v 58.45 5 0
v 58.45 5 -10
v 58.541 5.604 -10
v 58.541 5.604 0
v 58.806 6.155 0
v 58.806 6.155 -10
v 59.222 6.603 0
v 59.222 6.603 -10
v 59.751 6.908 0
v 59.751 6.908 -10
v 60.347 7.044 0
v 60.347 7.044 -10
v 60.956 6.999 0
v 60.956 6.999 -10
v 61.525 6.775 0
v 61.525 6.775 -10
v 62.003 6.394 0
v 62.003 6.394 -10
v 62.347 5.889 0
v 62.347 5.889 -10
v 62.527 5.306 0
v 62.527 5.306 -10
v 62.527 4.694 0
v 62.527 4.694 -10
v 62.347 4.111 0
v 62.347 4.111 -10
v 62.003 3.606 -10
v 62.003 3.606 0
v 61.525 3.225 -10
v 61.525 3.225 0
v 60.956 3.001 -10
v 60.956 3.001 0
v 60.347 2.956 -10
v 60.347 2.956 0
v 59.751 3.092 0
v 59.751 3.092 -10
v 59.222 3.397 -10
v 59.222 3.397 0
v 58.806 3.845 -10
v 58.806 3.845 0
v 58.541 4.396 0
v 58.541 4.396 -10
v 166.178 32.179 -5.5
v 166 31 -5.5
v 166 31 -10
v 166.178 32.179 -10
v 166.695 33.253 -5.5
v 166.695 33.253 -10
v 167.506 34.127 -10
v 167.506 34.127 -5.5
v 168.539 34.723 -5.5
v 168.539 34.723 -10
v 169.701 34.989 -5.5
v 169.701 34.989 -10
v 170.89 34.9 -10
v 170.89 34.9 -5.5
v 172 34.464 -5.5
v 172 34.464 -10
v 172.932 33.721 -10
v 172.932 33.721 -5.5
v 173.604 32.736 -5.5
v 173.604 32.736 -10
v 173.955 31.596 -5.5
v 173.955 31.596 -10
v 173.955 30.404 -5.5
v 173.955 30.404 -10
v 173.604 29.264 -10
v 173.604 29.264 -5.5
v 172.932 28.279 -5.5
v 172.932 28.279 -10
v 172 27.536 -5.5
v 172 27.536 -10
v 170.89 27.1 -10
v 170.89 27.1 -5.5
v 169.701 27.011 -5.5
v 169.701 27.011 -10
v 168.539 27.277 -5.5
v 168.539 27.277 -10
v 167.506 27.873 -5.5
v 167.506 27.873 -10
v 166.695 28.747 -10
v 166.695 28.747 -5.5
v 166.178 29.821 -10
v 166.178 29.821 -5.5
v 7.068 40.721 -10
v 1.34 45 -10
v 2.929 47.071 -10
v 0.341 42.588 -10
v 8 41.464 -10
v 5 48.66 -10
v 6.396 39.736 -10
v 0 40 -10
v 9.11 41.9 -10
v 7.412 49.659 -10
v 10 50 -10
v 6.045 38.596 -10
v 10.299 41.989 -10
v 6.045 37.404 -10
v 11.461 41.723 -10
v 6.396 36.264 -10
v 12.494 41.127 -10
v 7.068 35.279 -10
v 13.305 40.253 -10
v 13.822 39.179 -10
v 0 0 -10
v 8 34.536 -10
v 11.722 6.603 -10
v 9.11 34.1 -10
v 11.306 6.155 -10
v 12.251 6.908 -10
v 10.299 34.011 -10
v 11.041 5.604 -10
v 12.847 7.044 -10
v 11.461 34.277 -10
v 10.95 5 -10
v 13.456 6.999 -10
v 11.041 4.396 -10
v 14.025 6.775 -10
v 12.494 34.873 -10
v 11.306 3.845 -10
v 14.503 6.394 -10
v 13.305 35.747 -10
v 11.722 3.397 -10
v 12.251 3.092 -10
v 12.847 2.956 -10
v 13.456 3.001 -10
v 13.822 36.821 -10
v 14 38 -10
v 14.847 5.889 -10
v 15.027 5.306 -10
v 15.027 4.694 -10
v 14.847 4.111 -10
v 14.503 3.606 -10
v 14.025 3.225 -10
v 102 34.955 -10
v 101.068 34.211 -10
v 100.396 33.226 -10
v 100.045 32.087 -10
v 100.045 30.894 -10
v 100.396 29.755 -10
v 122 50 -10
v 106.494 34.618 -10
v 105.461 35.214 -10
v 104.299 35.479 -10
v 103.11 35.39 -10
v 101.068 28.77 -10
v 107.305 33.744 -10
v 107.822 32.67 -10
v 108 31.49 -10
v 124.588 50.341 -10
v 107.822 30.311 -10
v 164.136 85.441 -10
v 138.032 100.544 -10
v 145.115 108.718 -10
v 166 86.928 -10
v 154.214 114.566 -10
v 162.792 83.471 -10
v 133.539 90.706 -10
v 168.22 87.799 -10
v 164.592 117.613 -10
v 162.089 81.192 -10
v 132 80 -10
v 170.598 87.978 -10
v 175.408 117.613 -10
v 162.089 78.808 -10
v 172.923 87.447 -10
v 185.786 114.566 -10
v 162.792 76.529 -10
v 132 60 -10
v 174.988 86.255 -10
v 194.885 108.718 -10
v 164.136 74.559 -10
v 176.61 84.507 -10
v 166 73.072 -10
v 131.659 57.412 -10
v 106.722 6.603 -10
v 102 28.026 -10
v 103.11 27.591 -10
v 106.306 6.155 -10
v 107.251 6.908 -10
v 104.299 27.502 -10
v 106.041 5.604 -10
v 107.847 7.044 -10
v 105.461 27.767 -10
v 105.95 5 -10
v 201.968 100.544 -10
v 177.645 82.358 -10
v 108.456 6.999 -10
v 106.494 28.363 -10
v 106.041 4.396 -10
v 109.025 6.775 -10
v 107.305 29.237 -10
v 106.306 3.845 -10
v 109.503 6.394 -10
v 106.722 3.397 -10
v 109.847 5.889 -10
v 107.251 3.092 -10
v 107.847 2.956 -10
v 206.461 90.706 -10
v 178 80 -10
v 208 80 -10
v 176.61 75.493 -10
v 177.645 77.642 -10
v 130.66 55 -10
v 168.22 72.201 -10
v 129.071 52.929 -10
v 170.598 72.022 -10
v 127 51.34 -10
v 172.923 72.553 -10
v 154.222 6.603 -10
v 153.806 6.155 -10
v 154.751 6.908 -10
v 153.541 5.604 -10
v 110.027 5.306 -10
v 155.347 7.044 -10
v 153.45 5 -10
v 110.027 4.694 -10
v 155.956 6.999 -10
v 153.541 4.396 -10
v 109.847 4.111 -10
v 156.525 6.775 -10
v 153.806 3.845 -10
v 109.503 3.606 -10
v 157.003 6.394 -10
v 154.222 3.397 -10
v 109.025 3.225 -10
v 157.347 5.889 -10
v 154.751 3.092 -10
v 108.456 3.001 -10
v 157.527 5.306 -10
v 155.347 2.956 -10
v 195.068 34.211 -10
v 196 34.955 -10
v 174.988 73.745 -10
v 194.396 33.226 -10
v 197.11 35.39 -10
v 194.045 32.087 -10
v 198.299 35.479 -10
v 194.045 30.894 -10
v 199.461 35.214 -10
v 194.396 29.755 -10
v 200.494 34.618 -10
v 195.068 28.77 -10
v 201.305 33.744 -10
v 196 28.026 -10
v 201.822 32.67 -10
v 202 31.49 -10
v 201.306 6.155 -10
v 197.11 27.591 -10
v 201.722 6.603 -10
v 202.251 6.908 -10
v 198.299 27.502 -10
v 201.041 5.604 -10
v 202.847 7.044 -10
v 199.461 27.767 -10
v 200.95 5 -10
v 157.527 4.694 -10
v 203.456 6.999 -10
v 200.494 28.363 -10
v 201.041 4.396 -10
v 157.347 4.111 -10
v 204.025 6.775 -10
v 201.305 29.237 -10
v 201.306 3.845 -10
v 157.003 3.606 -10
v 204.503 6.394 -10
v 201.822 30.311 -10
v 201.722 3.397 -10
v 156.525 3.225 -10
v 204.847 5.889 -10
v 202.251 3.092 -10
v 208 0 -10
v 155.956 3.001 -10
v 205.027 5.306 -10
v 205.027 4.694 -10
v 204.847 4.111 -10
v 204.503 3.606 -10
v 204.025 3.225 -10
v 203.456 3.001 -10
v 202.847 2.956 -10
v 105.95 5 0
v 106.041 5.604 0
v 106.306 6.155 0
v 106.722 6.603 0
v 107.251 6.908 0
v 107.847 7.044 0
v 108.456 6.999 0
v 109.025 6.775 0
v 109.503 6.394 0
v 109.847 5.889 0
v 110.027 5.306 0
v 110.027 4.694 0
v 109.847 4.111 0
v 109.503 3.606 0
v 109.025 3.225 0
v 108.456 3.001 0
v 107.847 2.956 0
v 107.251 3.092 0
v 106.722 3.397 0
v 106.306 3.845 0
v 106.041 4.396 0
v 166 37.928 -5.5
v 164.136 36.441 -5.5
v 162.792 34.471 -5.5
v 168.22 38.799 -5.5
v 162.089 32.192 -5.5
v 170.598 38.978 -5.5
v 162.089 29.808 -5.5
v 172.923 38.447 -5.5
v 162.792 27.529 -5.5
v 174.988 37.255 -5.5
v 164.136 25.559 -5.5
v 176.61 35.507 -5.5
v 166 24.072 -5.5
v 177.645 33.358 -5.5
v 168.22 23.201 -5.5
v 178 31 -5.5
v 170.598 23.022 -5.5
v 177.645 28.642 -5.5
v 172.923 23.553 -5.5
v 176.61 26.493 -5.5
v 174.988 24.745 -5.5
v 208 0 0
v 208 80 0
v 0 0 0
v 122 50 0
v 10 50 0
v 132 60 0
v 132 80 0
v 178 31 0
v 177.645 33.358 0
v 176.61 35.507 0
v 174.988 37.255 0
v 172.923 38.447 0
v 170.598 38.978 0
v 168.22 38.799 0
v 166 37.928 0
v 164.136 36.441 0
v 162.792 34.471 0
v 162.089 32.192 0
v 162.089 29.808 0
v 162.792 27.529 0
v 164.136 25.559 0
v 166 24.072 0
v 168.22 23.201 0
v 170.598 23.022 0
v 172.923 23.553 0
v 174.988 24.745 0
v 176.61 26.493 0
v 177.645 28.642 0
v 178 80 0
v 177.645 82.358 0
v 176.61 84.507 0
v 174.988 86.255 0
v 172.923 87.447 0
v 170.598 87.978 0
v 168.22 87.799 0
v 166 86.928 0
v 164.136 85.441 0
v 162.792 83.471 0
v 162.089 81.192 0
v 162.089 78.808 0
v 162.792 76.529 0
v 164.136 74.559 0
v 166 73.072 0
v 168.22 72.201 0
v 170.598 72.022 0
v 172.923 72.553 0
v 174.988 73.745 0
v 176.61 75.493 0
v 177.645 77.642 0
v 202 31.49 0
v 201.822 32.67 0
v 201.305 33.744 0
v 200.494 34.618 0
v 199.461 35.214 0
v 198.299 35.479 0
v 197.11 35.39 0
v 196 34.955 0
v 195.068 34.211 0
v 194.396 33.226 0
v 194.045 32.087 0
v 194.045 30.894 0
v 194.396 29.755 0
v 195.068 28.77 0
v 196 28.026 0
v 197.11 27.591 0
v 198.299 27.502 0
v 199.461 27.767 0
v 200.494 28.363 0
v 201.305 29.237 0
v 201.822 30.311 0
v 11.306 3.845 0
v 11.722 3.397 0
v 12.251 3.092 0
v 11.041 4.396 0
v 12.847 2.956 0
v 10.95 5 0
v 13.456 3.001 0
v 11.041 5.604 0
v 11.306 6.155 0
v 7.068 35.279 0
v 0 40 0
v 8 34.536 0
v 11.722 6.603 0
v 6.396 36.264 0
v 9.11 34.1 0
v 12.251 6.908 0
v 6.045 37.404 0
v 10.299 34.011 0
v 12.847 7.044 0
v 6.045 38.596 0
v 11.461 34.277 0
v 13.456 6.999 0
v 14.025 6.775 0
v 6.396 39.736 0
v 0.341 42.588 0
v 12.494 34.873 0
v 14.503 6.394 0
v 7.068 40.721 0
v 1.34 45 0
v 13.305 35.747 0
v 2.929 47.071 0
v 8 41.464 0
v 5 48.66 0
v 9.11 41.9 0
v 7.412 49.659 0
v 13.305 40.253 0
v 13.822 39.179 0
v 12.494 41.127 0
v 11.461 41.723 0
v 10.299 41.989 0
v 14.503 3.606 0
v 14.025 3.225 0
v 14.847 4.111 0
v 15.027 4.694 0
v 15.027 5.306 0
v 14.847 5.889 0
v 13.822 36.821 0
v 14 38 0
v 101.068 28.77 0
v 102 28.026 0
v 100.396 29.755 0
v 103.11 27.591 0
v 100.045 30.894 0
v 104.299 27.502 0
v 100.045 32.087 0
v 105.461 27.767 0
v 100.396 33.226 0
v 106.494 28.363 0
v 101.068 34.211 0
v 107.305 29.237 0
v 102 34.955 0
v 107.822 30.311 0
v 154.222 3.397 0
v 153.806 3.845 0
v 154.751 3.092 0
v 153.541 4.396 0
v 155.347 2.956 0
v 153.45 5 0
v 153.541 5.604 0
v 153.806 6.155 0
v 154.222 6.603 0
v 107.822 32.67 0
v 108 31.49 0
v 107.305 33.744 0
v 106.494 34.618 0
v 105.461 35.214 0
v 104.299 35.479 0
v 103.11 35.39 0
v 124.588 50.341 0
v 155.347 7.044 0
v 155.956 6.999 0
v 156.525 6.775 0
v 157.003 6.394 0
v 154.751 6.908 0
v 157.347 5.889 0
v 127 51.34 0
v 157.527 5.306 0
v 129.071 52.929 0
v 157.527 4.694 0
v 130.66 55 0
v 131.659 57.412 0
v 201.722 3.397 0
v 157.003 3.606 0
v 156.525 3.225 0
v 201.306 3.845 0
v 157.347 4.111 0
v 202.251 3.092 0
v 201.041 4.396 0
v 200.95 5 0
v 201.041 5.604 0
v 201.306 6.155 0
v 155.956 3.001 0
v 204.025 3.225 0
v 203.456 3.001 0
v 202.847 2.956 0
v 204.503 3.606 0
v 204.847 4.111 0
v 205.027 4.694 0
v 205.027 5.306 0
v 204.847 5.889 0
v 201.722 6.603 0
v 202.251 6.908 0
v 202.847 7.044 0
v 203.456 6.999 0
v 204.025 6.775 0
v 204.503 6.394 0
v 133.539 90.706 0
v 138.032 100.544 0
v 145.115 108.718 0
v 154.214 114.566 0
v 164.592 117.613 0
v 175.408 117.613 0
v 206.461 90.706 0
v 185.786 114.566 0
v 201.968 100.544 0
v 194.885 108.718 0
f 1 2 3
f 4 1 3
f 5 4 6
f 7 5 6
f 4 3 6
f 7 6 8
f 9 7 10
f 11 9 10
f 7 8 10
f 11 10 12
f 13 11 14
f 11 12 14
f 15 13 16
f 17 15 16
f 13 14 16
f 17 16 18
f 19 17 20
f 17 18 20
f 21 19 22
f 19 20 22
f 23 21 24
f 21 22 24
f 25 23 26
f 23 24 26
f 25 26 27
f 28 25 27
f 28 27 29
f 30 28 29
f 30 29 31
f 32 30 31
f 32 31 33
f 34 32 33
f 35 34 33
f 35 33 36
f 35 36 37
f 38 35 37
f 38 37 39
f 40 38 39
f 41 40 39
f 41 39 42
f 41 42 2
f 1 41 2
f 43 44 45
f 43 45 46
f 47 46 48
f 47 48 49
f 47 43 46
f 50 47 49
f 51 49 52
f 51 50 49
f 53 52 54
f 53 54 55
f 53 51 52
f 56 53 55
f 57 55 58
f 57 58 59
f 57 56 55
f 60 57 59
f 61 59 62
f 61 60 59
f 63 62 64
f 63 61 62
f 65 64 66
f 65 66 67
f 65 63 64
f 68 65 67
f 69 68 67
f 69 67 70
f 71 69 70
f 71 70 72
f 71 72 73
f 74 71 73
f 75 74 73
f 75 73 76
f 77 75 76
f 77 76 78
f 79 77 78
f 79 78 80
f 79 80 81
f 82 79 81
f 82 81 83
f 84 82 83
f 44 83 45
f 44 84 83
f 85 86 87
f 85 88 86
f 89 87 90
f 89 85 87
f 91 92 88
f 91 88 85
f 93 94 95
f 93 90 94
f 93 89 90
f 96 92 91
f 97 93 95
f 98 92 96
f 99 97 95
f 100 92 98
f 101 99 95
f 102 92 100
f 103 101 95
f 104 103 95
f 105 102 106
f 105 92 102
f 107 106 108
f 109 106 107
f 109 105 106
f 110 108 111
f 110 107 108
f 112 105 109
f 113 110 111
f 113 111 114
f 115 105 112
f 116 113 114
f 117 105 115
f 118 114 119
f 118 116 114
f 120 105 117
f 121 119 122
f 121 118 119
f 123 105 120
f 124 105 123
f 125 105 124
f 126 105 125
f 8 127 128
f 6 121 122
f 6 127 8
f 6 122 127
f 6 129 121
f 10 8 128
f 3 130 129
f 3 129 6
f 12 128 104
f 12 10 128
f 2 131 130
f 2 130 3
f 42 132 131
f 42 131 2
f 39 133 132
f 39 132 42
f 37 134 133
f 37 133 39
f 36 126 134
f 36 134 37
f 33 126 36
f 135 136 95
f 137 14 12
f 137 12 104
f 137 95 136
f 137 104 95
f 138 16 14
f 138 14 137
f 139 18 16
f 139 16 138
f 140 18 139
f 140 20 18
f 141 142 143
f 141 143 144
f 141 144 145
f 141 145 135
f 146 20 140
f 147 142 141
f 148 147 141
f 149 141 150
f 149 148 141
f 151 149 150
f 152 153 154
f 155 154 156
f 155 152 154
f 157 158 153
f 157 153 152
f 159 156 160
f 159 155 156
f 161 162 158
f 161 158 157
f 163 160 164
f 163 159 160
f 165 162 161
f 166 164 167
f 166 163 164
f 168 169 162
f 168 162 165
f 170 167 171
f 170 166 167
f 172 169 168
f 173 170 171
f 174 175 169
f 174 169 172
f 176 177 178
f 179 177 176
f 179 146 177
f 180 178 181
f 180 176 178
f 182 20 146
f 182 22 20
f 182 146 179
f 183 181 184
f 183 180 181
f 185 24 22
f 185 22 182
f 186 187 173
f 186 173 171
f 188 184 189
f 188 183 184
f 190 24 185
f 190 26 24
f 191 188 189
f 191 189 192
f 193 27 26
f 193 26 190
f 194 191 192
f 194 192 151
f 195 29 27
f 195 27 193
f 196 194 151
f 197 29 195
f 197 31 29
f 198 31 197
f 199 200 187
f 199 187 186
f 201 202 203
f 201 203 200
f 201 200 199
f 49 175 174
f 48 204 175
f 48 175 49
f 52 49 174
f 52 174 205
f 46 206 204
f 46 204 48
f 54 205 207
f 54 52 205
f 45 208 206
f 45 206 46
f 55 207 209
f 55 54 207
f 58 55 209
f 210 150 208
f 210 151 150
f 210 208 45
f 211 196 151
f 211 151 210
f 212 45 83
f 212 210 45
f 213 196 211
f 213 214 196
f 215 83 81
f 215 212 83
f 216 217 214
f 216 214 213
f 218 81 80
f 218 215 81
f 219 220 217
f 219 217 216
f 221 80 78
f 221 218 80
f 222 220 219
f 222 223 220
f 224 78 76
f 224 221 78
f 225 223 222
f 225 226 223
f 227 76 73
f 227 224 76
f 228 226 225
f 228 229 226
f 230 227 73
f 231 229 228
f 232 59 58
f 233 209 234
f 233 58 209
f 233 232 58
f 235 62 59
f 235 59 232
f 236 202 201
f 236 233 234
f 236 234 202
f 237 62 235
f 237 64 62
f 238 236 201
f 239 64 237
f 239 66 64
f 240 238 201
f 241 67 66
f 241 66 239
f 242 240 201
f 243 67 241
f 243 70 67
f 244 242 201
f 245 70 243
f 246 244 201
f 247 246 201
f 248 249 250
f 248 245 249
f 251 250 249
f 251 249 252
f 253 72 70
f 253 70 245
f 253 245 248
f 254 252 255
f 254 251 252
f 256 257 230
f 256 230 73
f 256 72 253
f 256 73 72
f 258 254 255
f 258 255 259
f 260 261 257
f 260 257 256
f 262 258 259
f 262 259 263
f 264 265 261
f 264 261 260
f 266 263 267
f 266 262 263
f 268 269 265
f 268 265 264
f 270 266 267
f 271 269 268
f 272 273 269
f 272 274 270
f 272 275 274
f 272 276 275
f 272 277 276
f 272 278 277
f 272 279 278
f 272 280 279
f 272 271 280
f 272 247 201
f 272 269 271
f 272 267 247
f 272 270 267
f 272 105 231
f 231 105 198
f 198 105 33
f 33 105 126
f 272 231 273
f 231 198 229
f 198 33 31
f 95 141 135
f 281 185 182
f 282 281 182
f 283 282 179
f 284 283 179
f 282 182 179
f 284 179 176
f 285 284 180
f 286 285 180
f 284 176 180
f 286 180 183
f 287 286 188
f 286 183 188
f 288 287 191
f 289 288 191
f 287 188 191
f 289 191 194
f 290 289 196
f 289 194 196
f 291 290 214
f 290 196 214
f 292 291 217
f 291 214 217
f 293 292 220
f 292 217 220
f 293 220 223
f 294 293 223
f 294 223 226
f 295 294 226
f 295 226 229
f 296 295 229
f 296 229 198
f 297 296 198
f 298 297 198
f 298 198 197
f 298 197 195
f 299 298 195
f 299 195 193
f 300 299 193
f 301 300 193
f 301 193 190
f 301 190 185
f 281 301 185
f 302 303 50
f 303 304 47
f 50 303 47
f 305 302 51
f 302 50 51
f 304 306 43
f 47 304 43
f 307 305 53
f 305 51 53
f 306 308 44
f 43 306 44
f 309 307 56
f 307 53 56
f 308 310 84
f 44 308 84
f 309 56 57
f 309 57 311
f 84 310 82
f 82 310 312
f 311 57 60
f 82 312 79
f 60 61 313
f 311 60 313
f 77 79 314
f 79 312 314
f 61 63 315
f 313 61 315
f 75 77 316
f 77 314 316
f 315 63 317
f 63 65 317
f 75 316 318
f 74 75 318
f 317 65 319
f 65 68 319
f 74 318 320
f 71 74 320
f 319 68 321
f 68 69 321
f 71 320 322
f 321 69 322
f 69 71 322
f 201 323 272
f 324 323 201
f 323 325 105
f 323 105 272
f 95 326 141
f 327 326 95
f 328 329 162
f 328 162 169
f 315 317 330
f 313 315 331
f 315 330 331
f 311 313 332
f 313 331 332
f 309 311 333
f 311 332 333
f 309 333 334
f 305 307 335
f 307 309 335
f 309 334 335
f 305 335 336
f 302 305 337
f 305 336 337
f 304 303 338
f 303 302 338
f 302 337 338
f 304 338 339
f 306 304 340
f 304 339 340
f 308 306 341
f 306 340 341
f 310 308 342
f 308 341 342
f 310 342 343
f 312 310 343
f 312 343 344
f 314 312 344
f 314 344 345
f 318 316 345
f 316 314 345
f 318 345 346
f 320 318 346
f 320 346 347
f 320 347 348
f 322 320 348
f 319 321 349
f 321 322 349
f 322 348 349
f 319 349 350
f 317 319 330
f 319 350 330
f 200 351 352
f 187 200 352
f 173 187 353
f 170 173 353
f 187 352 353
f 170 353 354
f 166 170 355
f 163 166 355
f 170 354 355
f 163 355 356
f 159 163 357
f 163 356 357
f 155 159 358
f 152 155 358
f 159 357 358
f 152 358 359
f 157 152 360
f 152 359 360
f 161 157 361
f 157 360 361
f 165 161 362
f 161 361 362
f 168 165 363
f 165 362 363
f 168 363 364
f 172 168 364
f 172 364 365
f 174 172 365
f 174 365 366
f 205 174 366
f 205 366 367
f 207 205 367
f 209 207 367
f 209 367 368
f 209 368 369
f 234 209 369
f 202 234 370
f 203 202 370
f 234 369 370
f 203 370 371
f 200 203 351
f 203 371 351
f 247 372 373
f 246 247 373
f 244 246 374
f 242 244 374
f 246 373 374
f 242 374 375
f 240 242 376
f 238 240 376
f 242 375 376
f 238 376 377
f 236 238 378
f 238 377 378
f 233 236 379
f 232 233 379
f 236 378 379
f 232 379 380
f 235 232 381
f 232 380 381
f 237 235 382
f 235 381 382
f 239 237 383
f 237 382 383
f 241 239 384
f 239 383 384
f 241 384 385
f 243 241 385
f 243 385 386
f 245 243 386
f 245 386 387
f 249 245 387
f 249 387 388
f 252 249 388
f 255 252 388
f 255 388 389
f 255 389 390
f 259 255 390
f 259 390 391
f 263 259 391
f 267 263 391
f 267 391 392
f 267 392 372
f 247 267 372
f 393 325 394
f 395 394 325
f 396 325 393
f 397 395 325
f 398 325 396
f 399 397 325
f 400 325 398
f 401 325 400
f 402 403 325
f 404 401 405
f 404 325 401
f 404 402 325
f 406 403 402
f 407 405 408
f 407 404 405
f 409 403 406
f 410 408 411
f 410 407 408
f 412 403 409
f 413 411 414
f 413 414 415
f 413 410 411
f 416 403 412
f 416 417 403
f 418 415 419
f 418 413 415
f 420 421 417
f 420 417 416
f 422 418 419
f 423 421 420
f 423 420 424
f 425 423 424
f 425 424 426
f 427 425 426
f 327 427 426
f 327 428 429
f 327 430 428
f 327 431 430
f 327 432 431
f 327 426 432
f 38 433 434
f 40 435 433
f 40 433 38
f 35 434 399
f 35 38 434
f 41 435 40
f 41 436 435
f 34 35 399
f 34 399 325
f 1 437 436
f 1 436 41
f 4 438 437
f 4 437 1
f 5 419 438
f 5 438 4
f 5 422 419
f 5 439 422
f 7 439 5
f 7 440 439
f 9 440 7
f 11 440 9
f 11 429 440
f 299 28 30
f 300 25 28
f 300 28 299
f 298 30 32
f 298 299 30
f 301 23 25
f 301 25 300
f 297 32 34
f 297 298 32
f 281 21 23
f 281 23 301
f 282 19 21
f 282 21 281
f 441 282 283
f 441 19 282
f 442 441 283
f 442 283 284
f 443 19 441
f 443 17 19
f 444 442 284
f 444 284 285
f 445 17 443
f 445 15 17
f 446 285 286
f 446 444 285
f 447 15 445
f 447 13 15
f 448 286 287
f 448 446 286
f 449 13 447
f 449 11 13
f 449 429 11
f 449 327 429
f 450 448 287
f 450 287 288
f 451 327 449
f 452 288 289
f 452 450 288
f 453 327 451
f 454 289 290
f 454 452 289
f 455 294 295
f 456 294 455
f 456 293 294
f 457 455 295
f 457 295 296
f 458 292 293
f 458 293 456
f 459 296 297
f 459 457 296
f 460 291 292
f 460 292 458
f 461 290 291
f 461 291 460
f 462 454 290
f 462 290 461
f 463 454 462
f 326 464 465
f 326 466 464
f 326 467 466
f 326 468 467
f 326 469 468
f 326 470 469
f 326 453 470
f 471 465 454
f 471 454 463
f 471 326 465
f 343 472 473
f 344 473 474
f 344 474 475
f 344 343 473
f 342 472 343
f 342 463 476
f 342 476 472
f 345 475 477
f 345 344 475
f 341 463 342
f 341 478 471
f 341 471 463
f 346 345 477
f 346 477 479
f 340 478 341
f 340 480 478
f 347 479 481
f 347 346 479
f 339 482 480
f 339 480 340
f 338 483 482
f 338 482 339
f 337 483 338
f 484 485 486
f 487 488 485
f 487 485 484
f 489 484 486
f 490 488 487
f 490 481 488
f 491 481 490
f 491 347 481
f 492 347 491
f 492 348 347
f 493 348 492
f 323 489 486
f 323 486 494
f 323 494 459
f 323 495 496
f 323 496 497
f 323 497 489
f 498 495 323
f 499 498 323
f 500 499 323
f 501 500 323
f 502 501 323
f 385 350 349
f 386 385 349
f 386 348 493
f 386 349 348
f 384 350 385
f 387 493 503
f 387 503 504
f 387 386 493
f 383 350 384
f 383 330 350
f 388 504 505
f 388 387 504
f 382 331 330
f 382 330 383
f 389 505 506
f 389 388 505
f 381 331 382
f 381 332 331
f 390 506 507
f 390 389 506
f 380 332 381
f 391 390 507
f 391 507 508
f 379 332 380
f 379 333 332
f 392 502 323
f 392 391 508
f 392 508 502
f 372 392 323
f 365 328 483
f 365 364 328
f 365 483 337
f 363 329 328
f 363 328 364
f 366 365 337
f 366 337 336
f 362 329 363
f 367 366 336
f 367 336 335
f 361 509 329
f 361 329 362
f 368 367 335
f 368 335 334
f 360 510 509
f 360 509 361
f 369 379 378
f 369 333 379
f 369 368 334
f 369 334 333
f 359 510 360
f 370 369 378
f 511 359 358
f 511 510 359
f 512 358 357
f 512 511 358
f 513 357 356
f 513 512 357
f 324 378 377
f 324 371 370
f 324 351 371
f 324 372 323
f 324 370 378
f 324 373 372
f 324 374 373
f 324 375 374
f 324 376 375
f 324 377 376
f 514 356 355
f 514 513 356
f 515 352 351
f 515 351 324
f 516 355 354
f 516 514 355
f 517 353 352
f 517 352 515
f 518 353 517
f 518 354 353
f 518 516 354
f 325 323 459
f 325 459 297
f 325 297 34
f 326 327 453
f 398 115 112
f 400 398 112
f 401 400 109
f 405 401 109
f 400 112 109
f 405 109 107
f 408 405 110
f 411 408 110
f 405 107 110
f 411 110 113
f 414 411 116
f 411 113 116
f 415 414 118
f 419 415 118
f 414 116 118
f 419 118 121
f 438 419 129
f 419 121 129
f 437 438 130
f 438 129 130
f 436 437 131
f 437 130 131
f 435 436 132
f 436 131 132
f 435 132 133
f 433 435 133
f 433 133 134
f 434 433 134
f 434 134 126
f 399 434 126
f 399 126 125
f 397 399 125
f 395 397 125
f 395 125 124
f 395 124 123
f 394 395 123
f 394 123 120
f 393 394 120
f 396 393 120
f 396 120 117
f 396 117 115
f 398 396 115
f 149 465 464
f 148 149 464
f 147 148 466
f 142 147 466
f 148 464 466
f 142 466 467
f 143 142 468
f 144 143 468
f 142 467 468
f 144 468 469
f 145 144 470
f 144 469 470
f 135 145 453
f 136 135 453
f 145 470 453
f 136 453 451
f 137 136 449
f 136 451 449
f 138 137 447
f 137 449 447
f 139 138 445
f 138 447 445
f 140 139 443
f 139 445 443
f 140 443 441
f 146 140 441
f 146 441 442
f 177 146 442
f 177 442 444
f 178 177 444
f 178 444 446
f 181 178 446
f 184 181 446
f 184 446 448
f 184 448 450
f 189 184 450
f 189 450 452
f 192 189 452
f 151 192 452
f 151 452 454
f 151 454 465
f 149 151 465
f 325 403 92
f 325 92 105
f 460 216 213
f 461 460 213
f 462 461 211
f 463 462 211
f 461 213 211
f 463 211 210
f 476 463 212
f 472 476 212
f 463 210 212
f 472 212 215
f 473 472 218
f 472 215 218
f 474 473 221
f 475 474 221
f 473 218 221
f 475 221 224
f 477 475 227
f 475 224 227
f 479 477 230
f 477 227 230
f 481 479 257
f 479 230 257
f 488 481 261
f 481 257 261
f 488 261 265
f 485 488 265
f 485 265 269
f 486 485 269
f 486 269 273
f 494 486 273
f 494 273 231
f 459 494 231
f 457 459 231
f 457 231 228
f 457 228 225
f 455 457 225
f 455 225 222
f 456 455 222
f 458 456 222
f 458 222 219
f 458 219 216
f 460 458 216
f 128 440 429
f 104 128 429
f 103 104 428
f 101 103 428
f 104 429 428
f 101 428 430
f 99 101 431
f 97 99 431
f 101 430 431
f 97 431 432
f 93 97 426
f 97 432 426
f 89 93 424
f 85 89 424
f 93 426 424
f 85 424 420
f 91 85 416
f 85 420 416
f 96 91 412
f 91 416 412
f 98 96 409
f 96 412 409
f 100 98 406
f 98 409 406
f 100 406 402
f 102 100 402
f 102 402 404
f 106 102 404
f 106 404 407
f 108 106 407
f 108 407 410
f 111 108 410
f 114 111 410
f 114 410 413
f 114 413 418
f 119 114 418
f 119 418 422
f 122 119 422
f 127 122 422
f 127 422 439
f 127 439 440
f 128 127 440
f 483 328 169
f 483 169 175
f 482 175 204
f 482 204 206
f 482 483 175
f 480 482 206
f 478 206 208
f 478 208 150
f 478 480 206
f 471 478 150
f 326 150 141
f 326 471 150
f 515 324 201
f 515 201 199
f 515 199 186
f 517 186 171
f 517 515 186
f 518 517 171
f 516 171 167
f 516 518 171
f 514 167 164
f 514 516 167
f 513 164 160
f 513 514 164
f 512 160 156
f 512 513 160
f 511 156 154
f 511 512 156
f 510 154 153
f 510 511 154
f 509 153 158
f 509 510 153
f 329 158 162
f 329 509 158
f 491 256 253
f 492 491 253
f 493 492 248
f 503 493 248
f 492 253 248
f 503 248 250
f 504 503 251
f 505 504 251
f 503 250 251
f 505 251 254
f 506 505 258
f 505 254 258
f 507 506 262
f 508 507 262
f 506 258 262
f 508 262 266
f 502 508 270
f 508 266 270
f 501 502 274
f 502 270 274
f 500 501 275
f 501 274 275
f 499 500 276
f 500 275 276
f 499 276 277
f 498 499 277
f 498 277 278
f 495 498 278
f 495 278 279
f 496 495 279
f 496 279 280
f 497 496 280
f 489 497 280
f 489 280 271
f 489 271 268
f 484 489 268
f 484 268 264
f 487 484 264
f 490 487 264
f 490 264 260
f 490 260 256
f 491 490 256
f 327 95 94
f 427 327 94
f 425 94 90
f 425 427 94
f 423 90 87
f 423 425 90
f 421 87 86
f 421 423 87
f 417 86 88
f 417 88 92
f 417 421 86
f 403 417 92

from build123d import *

# Parameters (mm, degrees)
CROQUIS1_R              = 8
SALIENTE_EXTRUIR1_DEPTH = 10
CROQUIS2_R              = 2.05
CORTAR_EXTRUIR1_DEPTH   = 240.3491174
SALIENTE_EXTRUIR2_START = -4.5
CROQUIS3_R              = 8
CROQUIS3_R_2            = 4
SALIENTE_EXTRUIR2_DEPTH = 4.5
CROQUIS4_R              = 4
CORTAR_EXTRUIR2_DEPTH   = 240.3491174


with BuildPart() as part:
    # Croquis1 → Saliente-Extruir1 (new body)
    with BuildSketch(Plane.XY):
        with BuildLine():
            Line((0, 0), (208, 0))
            Line((208, 0), (208, 80))
            ThreePointArc((208, 80), (170, 118), (132, 80))
            Line((132, 80), (132, 60))
            ThreePointArc((132, 60), (129.071067812, 52.928932188), (122, 50))
            Line((122, 50), (10, 50))
            ThreePointArc((10, 50), (2.928932188, 47.071067812), (0, 40))
            Line((0, 40), (0, 0))
        make_face()
        with Locations((170, 80)):
            Circle(CROQUIS1_R, mode=Mode.SUBTRACT)
        with Locations((170, 31)):
            Circle(CROQUIS1_R, mode=Mode.SUBTRACT)
    extrude(amount=-SALIENTE_EXTRUIR1_DEPTH)

    # Croquis2 → Cortar-Extruir1 (cut, through all)
    with BuildSketch(Plane(origin=(0, 0, -10), x_dir=(-1, 0, 0), z_dir=(0, 0, -1))):
        with Locations((-203, 5)):
            Circle(CROQUIS2_R)
        with Locations((-155.5, 5)):
            Circle(CROQUIS2_R)
        with Locations((-108, 5)):
            Circle(CROQUIS2_R)
        with Locations((-60.5, 5)):
            Circle(CROQUIS2_R)
        with Locations((-13, 5)):
            Circle(CROQUIS2_R)
    extrude(amount=-CORTAR_EXTRUIR1_DEPTH, mode=Mode.SUBTRACT)

    # Croquis3 → Saliente-Extruir2 (add)
    with BuildSketch(Plane(origin=(0, 0, -10), x_dir=(-1, 0, 0), z_dir=(0, 0, -1)).offset(SALIENTE_EXTRUIR2_START)):
        with Locations(Location((-170, 31, 0), (0, 0, 180))):
            Circle(CROQUIS3_R)
        with Locations((-170, 31)):
            Circle(CROQUIS3_R_2, mode=Mode.SUBTRACT)
    extrude(amount=SALIENTE_EXTRUIR2_DEPTH)

    # Croquis4 → Cortar-Extruir2 (cut, through all)
    with BuildSketch(Plane.XY):
        with Locations((198, 31.490486181)):
            Circle(CROQUIS4_R)
        with Locations((104, 31.490486181)):
            Circle(CROQUIS4_R)
        with Locations((10, 38)):
            Circle(CROQUIS4_R)
    extrude(amount=-CORTAR_EXTRUIR2_DEPTH, mode=Mode.SUBTRACT)


solid = part.part
